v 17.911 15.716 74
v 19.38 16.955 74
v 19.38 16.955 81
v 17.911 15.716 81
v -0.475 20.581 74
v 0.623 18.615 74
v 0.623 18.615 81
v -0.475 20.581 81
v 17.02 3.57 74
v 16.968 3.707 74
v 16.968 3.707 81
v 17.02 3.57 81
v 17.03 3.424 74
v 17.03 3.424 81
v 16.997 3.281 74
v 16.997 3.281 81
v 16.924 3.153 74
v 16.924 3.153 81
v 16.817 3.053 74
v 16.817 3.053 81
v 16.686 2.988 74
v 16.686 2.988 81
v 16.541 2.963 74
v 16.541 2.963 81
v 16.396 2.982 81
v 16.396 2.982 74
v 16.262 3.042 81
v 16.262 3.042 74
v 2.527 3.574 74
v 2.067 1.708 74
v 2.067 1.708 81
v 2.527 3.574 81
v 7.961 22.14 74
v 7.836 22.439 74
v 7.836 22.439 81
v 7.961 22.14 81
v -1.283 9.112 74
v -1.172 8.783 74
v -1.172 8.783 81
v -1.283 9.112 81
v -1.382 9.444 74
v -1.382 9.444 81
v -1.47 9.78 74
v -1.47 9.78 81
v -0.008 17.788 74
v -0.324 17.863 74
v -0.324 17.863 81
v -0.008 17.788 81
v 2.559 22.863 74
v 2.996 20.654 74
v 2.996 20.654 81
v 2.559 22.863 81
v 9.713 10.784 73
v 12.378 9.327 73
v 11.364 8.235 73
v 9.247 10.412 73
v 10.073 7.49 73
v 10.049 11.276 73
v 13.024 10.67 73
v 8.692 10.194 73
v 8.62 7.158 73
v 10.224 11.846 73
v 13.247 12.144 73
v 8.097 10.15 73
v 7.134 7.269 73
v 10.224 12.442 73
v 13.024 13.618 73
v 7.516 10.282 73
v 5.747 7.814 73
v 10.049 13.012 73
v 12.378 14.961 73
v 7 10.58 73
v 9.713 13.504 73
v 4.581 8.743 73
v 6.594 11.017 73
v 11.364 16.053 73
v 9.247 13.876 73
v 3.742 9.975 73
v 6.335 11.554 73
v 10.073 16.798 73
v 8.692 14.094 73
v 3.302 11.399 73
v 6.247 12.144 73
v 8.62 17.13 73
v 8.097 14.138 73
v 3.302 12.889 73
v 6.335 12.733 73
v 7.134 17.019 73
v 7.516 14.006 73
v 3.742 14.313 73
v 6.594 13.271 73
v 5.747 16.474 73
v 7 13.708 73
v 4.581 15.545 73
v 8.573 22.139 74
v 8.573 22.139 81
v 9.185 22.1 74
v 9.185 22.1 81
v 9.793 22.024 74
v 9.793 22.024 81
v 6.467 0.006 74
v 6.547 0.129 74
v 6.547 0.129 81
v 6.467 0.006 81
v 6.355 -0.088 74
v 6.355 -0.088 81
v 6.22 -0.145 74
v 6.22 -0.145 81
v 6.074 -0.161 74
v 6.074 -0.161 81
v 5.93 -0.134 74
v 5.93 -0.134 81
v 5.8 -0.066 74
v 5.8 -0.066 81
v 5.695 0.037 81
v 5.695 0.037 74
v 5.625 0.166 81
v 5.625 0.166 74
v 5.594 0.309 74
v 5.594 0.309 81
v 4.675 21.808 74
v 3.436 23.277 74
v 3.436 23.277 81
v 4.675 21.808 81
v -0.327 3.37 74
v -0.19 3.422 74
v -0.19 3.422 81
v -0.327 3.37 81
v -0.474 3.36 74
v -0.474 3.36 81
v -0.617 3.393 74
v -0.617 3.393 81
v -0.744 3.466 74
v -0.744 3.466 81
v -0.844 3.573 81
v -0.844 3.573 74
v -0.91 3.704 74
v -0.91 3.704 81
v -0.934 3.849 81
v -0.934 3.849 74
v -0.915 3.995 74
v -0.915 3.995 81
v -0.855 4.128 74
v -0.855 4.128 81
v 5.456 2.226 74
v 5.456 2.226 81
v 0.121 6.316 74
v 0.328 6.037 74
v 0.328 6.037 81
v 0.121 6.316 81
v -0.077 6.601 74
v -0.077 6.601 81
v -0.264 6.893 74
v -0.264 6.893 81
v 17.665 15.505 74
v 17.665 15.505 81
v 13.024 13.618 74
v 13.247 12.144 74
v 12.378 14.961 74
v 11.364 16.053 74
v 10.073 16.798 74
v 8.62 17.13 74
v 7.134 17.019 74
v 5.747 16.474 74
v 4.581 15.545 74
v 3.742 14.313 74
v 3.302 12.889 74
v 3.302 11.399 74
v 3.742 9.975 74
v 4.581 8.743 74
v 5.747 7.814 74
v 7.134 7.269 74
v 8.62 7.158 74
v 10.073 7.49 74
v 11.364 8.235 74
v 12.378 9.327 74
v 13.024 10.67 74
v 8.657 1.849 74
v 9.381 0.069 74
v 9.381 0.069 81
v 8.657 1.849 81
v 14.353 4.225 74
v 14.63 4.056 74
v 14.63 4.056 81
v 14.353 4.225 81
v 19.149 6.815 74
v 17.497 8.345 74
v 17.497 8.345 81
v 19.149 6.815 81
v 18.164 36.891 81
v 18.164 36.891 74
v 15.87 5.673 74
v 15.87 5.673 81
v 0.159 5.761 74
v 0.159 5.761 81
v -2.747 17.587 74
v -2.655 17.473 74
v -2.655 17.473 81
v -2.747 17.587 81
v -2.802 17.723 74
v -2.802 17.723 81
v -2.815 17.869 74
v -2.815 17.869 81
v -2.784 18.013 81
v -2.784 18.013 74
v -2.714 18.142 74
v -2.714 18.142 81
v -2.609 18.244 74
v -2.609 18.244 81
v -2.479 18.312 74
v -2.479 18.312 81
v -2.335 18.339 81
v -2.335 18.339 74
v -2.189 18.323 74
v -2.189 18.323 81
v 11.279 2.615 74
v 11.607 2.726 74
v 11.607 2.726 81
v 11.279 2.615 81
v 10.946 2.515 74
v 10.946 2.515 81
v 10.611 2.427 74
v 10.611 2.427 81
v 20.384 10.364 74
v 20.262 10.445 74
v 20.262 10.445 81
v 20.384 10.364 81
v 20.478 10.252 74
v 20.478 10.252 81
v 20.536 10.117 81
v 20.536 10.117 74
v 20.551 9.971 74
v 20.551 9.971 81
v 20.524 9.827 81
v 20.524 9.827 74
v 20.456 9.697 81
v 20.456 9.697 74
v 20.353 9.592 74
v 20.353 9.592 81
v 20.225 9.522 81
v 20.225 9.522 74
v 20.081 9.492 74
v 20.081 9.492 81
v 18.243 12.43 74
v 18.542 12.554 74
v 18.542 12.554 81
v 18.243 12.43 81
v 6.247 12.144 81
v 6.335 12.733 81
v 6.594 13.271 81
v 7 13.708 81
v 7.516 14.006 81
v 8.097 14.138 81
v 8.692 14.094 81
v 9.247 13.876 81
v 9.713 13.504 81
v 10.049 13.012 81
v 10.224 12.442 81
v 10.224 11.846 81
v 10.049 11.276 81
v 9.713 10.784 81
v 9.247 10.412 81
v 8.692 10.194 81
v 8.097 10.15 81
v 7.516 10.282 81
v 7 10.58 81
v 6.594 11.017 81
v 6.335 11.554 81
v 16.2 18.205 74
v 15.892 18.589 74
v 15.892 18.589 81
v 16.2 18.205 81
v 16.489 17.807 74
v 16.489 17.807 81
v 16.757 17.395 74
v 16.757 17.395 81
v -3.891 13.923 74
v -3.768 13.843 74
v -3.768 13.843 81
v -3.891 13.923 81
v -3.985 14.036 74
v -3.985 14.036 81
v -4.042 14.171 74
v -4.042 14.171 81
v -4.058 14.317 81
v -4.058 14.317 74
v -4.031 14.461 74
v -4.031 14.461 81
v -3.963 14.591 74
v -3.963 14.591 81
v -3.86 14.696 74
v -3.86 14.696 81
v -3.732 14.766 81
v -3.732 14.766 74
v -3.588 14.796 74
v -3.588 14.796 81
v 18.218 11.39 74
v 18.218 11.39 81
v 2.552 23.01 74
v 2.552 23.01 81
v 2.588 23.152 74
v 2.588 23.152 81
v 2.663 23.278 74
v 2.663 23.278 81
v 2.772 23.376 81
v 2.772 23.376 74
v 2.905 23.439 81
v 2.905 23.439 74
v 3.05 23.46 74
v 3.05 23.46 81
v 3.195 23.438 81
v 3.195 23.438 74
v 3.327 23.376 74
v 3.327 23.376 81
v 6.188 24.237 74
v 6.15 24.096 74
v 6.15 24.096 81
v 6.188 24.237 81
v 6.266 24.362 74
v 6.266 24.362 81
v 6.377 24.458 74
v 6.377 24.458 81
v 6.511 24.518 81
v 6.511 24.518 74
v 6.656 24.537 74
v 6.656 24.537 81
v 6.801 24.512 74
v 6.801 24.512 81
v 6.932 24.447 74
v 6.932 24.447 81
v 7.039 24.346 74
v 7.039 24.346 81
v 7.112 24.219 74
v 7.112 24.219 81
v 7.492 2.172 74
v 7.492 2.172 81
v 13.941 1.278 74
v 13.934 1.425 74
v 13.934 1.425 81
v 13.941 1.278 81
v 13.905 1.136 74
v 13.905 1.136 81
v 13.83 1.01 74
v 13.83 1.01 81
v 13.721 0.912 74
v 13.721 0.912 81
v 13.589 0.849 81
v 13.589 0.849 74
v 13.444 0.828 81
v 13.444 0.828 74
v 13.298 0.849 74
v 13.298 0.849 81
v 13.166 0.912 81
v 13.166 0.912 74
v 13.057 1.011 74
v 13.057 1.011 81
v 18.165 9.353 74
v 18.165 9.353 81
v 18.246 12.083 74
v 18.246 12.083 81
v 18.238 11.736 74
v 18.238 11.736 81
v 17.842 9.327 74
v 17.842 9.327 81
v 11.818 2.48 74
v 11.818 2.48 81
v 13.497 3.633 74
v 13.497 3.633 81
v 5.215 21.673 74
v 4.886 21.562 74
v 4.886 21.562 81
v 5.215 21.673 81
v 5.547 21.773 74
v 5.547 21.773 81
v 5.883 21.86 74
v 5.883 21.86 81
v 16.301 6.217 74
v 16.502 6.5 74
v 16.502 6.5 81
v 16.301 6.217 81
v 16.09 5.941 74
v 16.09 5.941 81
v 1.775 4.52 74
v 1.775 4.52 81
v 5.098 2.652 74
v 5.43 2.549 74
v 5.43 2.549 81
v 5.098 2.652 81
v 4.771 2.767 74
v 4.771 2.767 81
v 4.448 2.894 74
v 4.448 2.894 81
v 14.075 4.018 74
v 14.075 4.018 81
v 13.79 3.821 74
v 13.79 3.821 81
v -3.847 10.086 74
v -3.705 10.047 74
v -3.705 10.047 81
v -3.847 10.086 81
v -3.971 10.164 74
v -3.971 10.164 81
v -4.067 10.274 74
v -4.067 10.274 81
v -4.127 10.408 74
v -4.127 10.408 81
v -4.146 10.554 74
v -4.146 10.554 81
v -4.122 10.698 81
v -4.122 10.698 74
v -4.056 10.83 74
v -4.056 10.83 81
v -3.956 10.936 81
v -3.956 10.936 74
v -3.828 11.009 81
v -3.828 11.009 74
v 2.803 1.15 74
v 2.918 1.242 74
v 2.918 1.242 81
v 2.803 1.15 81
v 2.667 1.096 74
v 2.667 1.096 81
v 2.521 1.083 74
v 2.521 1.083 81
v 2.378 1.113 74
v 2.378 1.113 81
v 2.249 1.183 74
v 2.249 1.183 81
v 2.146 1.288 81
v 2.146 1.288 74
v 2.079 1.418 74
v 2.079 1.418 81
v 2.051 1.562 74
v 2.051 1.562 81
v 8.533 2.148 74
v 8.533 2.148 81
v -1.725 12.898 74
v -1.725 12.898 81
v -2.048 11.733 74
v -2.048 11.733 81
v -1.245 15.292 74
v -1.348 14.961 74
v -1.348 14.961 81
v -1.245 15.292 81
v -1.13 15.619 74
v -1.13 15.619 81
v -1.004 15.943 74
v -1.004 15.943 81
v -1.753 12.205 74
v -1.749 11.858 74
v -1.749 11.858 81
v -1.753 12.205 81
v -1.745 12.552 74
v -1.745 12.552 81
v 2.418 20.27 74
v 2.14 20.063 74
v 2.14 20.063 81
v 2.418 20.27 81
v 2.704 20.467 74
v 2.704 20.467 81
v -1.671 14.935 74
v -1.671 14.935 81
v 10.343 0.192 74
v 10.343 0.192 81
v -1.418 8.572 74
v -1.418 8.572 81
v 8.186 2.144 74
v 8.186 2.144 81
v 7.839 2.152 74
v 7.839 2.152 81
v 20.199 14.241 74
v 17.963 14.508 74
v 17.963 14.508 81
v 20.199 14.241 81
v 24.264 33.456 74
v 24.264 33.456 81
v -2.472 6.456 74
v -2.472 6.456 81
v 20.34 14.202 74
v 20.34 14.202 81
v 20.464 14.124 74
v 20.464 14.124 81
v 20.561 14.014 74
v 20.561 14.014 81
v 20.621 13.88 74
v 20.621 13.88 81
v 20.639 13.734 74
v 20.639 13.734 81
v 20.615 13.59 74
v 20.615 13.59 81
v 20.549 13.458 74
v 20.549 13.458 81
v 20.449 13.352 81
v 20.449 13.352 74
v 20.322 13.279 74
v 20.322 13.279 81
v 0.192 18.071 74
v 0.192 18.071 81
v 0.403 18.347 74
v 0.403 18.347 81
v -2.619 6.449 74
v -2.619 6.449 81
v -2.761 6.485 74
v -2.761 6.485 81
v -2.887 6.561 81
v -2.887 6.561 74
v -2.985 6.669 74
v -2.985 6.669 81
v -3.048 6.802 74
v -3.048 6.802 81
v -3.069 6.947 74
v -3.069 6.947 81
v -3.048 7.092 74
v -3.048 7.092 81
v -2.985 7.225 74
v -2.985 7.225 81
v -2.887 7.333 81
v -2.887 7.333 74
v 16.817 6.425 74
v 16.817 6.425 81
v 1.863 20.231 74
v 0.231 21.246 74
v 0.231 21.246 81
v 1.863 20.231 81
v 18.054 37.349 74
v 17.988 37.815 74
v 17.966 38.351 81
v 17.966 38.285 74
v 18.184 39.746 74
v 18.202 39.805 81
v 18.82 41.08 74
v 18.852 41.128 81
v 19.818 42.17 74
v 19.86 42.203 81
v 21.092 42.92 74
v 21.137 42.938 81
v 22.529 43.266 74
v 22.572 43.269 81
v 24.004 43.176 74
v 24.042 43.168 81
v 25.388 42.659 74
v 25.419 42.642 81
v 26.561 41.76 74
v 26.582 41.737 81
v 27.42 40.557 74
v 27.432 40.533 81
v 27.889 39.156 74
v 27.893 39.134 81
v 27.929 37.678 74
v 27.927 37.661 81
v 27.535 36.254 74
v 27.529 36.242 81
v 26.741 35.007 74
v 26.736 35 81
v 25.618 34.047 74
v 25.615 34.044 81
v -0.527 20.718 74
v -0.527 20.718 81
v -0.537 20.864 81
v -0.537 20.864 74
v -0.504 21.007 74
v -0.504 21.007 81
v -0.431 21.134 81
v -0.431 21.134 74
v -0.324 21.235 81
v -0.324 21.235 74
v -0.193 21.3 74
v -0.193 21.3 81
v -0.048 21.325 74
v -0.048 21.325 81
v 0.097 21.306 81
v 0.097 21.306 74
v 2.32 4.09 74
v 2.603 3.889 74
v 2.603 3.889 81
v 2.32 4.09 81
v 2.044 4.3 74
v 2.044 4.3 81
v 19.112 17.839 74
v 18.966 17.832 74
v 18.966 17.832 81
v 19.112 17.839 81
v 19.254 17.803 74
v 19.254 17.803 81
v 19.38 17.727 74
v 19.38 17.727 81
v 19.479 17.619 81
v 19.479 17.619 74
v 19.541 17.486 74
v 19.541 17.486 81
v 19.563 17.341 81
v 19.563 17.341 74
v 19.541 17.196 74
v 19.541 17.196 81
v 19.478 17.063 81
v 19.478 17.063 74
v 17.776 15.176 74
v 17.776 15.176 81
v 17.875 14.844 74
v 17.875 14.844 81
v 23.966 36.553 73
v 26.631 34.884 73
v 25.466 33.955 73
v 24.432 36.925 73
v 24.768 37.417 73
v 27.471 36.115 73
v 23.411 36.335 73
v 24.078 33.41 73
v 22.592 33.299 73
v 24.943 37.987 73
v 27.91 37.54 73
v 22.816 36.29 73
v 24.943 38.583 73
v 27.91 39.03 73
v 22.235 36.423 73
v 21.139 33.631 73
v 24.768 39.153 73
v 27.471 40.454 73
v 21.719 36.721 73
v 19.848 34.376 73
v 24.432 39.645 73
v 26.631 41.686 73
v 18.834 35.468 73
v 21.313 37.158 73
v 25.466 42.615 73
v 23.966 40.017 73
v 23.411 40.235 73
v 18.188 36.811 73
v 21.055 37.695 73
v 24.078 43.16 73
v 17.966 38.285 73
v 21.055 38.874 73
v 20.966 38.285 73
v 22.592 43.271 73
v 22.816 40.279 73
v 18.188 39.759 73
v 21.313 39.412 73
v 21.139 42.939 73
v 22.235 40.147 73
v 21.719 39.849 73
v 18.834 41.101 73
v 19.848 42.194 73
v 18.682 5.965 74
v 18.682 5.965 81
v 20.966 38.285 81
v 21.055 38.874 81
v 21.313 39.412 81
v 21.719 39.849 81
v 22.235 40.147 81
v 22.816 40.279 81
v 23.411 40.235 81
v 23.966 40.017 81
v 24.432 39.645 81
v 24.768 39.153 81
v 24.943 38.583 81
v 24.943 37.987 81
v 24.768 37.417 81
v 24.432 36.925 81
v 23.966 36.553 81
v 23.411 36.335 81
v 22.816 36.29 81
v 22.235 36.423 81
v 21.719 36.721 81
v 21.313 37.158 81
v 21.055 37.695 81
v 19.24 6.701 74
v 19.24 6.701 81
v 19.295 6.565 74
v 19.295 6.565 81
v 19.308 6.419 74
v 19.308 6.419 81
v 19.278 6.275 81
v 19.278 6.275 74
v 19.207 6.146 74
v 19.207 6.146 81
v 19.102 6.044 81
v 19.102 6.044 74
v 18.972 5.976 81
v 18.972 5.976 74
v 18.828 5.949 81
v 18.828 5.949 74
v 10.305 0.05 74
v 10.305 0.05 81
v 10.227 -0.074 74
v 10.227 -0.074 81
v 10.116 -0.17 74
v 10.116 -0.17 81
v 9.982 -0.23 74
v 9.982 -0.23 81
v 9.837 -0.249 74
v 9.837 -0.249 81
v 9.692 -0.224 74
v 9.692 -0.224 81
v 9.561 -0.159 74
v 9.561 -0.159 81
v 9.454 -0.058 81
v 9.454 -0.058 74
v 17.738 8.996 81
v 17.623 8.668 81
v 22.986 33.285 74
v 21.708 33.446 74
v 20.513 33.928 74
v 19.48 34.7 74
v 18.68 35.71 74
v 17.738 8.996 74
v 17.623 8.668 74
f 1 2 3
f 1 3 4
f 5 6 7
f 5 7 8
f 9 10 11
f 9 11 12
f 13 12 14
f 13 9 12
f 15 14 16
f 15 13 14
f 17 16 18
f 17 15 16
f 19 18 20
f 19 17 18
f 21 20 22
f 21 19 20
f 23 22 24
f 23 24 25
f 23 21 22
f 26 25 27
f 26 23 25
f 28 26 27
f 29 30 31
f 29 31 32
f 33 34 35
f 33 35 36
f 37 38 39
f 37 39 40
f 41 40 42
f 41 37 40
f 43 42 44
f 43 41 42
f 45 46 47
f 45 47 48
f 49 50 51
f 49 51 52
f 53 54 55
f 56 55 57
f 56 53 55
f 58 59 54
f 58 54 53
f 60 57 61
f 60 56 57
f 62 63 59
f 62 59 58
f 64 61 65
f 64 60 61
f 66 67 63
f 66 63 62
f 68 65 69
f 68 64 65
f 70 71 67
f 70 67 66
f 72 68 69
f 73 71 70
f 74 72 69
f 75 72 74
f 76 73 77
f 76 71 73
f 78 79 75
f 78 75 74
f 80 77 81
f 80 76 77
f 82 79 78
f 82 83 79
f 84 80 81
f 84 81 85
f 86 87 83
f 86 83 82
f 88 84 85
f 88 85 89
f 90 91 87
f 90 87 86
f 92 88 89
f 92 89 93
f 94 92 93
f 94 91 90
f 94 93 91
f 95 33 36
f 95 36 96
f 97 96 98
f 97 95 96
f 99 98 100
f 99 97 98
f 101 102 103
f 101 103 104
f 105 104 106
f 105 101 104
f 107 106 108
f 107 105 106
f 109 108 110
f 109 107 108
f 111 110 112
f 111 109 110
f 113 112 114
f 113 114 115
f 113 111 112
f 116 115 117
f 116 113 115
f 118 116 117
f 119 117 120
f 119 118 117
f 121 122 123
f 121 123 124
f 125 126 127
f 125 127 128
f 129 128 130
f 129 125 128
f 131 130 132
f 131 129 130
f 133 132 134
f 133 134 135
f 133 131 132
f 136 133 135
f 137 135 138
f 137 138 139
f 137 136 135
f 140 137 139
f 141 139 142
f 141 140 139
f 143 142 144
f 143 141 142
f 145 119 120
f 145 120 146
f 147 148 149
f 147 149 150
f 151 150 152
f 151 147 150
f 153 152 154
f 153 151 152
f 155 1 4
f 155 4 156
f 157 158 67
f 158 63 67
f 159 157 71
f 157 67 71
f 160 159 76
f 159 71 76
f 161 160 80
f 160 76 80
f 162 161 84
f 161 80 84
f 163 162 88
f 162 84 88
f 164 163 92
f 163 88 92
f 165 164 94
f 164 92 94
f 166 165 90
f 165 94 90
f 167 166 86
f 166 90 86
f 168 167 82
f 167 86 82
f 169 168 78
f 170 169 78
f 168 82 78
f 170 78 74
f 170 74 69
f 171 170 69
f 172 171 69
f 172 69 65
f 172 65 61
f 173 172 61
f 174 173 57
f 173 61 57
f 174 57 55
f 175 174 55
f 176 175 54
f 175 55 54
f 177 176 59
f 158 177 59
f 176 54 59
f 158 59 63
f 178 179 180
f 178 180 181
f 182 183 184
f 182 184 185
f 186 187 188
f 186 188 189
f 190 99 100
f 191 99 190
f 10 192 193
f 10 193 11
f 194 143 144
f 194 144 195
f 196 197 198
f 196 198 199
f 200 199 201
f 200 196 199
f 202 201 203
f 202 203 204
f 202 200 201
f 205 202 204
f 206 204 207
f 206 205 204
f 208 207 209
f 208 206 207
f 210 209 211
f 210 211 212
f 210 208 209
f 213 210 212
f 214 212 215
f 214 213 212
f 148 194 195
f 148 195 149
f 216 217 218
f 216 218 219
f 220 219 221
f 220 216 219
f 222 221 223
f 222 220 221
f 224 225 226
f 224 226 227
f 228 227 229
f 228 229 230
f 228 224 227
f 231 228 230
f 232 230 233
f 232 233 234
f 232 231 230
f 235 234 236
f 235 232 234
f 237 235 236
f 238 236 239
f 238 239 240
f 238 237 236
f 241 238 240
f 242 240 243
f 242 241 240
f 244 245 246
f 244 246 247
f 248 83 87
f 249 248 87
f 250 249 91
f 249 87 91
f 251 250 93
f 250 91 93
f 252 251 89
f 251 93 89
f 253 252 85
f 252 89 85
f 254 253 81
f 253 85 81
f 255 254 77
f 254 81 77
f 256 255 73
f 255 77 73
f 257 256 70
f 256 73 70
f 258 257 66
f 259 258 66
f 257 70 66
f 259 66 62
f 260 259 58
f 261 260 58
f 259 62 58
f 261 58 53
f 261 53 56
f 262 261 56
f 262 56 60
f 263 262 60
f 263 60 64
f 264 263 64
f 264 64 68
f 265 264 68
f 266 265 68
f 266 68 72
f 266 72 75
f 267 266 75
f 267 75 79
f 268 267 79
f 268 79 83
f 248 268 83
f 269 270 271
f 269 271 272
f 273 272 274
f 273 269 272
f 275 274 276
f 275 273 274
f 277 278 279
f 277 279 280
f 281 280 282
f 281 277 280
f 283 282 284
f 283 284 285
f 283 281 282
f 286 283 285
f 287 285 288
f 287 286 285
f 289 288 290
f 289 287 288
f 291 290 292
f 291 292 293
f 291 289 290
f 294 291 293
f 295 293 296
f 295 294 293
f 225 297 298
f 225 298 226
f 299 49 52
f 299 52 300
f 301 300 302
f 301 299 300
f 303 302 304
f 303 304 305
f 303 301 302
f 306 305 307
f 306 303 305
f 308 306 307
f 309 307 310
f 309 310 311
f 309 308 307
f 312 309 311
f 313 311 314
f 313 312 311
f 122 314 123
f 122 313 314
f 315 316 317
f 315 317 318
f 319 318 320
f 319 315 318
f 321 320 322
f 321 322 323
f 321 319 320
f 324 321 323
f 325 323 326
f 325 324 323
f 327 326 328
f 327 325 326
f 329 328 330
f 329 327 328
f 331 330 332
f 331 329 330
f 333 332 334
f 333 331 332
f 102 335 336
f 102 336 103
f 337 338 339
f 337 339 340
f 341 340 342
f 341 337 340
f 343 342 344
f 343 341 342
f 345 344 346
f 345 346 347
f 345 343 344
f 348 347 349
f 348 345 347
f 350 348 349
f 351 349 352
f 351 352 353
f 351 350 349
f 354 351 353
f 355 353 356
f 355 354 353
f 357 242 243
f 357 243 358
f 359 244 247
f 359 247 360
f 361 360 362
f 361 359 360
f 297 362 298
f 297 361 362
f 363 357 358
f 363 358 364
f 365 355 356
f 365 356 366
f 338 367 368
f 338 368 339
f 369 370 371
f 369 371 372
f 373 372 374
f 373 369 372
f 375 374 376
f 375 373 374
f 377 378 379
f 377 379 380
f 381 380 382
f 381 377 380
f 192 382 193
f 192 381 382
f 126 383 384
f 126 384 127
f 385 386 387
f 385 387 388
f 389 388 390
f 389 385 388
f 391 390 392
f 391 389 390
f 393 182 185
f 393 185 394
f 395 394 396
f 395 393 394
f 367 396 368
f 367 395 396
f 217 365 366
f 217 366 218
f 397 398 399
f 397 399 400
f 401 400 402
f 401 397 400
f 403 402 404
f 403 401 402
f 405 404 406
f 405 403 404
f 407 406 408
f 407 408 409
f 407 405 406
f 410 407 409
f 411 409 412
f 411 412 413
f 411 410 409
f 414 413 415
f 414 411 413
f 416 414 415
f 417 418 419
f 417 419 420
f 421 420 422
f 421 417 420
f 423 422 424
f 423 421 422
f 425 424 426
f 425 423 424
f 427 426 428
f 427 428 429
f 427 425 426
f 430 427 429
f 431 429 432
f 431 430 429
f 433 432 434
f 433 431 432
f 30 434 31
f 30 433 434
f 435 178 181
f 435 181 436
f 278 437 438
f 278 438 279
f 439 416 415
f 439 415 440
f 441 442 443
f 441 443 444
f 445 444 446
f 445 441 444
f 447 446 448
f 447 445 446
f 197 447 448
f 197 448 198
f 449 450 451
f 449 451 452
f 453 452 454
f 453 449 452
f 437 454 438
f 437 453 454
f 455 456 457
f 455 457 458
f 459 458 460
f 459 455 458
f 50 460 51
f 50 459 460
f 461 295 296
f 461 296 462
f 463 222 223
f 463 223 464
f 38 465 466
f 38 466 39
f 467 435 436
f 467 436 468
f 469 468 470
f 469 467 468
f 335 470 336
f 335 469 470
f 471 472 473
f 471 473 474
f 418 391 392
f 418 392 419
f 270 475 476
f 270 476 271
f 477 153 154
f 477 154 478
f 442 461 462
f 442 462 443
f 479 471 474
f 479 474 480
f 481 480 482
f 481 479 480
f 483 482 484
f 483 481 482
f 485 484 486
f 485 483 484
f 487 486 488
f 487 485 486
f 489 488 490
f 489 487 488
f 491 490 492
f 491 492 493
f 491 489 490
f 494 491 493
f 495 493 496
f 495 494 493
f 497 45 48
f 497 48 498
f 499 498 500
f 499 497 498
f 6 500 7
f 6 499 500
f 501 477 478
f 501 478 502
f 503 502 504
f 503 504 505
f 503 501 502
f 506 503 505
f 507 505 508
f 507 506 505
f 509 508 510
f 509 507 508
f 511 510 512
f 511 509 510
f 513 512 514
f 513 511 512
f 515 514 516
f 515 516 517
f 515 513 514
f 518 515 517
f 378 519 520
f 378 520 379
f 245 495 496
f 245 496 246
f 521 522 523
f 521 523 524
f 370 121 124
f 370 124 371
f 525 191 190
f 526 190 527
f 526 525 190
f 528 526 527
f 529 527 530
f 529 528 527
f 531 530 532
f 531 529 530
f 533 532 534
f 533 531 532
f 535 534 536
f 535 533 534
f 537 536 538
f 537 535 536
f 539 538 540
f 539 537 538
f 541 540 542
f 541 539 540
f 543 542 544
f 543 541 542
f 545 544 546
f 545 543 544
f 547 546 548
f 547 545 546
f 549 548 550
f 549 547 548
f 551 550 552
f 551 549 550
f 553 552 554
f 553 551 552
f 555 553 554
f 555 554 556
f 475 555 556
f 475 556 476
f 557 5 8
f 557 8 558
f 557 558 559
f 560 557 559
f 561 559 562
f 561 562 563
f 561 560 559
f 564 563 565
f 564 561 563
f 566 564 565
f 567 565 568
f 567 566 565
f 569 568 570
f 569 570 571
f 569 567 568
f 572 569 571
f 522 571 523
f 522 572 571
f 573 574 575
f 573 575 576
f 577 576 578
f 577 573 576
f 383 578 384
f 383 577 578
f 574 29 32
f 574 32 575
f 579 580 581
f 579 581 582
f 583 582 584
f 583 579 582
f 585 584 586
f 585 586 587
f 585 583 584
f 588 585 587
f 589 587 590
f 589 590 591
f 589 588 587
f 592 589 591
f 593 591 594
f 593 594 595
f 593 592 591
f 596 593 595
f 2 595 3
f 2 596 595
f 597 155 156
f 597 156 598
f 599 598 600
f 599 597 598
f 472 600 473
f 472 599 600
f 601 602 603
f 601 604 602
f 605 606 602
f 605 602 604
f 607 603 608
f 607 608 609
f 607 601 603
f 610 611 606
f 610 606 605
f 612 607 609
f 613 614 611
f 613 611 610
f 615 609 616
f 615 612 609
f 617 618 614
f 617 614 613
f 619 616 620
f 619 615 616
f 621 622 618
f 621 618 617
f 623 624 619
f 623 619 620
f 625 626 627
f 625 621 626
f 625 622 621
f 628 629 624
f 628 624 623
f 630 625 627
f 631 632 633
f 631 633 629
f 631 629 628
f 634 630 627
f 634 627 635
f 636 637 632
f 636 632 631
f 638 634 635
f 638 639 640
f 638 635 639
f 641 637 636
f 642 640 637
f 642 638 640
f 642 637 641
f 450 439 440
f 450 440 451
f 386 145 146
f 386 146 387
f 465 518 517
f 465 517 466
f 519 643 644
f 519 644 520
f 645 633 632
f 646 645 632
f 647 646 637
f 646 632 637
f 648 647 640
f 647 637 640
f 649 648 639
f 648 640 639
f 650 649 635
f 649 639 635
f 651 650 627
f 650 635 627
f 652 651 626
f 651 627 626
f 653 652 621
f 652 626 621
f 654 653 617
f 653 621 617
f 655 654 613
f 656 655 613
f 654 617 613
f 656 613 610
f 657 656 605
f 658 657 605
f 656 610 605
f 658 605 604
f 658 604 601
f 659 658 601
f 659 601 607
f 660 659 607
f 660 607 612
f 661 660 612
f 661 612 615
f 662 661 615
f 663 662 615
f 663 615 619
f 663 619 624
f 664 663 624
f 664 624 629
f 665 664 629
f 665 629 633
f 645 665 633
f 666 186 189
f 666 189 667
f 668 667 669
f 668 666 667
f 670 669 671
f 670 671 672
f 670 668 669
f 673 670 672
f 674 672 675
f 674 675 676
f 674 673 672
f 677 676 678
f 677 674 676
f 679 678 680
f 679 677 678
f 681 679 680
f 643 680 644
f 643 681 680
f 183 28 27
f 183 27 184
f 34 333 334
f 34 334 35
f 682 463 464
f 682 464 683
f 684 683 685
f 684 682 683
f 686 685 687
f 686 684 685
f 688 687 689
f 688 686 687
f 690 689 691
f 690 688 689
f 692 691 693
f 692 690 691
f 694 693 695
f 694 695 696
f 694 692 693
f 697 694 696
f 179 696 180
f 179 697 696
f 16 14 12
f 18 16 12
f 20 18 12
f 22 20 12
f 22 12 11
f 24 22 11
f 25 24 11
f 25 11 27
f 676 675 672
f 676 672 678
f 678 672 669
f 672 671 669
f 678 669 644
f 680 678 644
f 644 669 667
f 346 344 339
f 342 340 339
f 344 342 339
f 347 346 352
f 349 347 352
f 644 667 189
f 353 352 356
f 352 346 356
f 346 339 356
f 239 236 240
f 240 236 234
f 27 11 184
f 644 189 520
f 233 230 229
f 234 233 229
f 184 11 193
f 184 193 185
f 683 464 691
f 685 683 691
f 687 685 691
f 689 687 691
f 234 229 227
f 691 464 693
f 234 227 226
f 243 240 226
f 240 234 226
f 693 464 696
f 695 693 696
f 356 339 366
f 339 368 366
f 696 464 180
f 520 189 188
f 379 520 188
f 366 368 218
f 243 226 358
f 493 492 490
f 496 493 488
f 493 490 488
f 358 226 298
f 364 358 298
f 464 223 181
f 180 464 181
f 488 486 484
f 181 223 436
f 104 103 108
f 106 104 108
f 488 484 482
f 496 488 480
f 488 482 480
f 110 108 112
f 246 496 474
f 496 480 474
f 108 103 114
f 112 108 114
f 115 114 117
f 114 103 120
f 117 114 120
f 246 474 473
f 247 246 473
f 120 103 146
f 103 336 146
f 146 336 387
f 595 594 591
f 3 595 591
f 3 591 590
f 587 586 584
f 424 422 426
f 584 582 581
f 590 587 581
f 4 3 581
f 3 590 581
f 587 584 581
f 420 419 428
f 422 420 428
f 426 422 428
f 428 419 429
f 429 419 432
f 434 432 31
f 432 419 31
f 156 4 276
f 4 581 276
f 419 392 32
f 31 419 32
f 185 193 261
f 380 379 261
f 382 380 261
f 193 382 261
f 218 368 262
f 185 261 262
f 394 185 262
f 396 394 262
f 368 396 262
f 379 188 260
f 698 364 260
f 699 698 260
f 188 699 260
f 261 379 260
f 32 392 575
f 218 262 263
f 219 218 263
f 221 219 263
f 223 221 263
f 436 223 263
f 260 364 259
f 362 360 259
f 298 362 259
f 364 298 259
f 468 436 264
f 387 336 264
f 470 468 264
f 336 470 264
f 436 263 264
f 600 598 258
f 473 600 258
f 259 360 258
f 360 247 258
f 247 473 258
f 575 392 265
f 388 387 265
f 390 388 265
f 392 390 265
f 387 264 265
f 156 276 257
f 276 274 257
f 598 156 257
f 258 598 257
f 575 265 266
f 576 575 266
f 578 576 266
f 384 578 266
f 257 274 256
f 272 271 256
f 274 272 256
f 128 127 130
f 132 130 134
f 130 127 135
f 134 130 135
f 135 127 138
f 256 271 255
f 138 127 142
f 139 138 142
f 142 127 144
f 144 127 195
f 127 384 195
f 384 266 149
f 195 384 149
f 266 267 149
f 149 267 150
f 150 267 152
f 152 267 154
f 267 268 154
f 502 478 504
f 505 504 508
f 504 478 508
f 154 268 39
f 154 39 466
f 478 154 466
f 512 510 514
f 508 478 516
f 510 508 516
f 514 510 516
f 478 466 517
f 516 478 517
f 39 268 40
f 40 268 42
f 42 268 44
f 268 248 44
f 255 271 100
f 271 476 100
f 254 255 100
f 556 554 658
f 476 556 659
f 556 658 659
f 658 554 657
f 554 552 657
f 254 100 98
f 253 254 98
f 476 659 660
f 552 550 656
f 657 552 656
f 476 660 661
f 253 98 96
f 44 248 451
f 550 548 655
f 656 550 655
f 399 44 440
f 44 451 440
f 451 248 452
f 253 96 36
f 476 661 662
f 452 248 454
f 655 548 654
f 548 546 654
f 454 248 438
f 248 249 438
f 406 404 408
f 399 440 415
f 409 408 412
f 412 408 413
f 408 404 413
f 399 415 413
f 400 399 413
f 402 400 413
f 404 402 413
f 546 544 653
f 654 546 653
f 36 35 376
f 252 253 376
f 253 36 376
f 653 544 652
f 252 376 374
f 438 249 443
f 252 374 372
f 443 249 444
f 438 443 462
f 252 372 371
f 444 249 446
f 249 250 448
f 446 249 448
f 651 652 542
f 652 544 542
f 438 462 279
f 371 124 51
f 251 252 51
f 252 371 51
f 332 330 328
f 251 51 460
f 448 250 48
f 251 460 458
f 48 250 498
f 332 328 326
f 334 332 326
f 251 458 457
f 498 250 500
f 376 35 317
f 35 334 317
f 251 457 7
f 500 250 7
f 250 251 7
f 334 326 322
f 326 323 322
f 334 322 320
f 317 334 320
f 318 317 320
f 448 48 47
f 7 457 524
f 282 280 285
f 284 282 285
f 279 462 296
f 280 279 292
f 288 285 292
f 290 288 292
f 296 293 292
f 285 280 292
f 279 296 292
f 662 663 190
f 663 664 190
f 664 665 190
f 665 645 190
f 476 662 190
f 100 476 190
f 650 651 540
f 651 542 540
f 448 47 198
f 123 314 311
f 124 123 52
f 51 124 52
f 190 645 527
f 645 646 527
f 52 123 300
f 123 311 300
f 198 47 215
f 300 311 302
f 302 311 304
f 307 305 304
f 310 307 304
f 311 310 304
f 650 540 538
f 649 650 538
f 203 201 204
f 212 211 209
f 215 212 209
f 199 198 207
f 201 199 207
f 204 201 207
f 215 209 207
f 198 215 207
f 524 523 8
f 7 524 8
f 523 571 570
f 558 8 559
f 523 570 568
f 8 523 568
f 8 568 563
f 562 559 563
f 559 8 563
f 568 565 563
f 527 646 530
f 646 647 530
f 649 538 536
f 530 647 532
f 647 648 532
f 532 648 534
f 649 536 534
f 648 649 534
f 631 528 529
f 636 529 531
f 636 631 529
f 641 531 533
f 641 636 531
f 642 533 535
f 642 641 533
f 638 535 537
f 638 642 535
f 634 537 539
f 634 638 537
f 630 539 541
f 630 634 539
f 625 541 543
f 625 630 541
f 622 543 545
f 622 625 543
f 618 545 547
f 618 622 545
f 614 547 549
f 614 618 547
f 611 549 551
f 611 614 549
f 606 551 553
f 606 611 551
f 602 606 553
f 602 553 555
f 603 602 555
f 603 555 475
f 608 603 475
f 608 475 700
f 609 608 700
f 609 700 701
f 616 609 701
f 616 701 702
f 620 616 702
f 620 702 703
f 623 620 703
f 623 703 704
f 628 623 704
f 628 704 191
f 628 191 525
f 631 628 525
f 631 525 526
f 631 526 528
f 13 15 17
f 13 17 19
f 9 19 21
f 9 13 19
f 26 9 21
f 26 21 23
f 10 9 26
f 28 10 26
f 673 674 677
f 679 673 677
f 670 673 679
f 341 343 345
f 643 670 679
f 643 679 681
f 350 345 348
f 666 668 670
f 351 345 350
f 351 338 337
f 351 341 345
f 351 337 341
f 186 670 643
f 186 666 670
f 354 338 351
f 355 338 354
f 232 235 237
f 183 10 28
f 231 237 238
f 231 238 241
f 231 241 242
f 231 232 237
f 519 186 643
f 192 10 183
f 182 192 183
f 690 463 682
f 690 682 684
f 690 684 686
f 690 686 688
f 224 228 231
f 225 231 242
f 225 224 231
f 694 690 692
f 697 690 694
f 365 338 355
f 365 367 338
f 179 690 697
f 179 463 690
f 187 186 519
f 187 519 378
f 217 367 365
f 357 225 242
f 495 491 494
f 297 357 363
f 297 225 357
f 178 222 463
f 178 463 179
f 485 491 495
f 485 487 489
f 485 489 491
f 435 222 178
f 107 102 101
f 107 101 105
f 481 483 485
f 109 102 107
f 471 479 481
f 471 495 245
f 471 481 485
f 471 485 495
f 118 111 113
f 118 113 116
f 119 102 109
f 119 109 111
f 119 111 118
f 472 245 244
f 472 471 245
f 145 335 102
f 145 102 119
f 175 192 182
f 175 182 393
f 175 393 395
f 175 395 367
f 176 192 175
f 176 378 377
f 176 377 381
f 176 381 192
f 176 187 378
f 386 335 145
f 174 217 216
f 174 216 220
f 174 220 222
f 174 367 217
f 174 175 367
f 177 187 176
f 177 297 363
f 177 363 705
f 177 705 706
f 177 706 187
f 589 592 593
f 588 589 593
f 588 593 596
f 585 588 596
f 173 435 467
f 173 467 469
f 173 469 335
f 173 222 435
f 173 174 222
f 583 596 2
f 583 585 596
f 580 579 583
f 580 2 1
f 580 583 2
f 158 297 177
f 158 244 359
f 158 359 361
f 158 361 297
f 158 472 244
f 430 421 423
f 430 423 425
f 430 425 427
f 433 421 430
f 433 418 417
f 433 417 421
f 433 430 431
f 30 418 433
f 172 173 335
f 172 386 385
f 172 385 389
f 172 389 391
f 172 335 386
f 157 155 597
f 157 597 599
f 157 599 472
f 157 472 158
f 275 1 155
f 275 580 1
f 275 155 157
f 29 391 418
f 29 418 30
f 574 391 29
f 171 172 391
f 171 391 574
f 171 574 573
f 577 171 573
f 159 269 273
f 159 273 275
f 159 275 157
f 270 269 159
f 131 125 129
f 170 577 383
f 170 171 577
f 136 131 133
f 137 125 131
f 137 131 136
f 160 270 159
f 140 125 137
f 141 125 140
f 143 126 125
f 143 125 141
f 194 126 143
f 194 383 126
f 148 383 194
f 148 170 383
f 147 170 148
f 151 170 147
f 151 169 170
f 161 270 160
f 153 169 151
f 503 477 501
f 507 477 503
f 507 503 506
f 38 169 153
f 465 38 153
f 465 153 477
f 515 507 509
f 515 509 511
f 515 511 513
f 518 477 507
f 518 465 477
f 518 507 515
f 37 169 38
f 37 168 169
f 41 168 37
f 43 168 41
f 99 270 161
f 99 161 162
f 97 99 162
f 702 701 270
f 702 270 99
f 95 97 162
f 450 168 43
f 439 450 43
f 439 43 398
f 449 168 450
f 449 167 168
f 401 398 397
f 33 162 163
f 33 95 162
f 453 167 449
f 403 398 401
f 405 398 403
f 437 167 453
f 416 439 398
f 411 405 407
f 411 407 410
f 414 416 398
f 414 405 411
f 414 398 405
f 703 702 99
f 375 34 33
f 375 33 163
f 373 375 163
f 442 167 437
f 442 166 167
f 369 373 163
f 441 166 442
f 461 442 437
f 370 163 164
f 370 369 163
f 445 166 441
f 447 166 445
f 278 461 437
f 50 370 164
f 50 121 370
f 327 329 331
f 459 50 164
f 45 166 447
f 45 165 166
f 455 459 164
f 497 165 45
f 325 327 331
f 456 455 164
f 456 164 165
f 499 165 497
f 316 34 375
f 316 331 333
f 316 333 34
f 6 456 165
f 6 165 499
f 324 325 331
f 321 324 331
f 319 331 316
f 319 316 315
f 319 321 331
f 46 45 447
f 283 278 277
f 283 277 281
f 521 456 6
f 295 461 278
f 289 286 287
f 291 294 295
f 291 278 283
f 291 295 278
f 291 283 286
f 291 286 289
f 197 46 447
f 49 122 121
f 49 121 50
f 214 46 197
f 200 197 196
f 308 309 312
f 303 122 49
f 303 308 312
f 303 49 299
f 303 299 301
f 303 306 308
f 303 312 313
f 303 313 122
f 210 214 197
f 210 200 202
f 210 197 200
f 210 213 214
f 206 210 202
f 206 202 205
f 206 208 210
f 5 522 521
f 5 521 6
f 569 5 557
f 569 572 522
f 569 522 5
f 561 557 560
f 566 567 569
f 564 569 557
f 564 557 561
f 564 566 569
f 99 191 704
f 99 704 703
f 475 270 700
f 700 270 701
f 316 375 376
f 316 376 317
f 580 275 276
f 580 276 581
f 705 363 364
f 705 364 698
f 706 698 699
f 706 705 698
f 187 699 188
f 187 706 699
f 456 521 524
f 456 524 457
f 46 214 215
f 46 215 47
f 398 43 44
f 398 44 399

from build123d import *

# Parameters (mm, degrees)
BOSS_EXTRUDE1_DEPTH      = 7
BOSS_EXTRUDE2_START      = 1
SKETCH2_R                = 5
BOSS_EXTRUDE2_DEPTH      = 1
SKETCH3_W                = 5
SKETCH3_H                = 1
F_4_0_4_DIAMETER_HOLE1_D = 4


with BuildPart() as part:
    # Sketch1 → Boss-Extrude1 (new body)
    with BuildSketch(Plane(origin=(0, 0, 74), x_dir=(-1, 0, 0), z_dir=(0, 0, -1))):
        with BuildLine():
            Line((-9.792858273, 22.023664764), (-18.163987442, 36.890703242))
            ThreePointArc((-18.163987442, 36.890703242), (-25.418865109, 42.641693781), (-24.263539525, 33.456250682))
            Line((-24.263539525, 33.456250682), (-15.892410356, 18.589212204))
            ThreePointArc((-15.892410356, 18.589212204), (-16.346796769, 18.007963525), (-16.757092444, 17.394795929))
            Line((-16.757092444, 17.394795929), (-18.965700238, 17.831555144))
            ThreePointArc((-18.965700238, 17.831555144), (-19.514808102, 17.55458812), (-19.379909826, 16.954560925))
            Line((-19.379909826, 16.954560925), (-17.910889228, 15.715657441))
            Line((-17.910889228, 15.715657441), (-17.664910308, 15.504807423))
            ThreePointArc((-17.664910308, 15.504807423), (-17.827013037, 15.010242888), (-17.963165175, 14.507914341))
            Line((-17.963165175, 14.507914341), (-20.19864203, 14.240799695))
            ThreePointArc((-20.19864203, 14.240799695), (-20.635287125, 13.80770474), (-20.32157264, 13.278730827))
            Line((-20.32157264, 13.278730827), (-18.541608797, 12.554415925))
            Line((-18.541608797, 12.554415925), (-18.242512703, 12.429897308))
            ThreePointArc((-18.242512703, 12.429897308), (-18.243852713, 11.909445986), (-18.218113034, 11.389629824))
            Line((-18.218113034, 11.389629824), (-20.261634899, 10.444788361))
            ThreePointArc((-20.261634899, 10.444788361), (-20.543075361, 9.897959827), (-20.081253227, 9.491818847))
            Line((-20.081253227, 9.491818847), (-18.164581401, 9.352993516))
            Line((-18.164581401, 9.352993516), (-17.841645743, 9.32699505))
            ThreePointArc((-17.841645743, 9.32699505), (-17.682091866, 8.831602343), (-17.496979948, 8.345181793))
            Line((-17.496979948, 8.345181793), (-19.148512665, 6.815101178))
            ThreePointArc((-19.148512665, 6.815101178), (-19.247199139, 6.208066452), (-18.682475725, 5.964514314))
            Line((-18.682475725, 5.964514314), (-16.816713109, 6.424767746))
            Line((-16.816713109, 6.424767746), (-16.501549079, 6.499834341))
            ThreePointArc((-16.501549079, 6.499834341), (-16.196719559, 6.077992739), (-15.870355447, 5.672582033))
            Line((-15.870355447, 5.672582033), (-16.968235486, 3.707037218))
            ThreePointArc((-16.968235486, 3.707037218), (-16.874507855, 3.099217089), (-16.262162222, 3.042094373))
            Line((-16.262162222, 3.042094373), (-14.62994266, 4.056373754))
            Line((-14.62994266, 4.056373754), (-14.353400709, 4.22515737))
            ThreePointArc((-14.353400709, 4.22515737), (-13.933134384, 3.918159668), (-13.497464871, 3.633443231))
            Line((-13.497464871, 3.633443231), (-13.934224085, 1.424835437))
            ThreePointArc((-13.934224085, 1.424835437), (-13.657257061, 0.875727573), (-13.057229867, 1.010625848))
            Line((-13.057229867, 1.010625848), (-11.818326382, 2.479646446))
            Line((-11.818326382, 2.479646446), (-11.607476364, 2.725625367))
            ThreePointArc((-11.607476364, 2.725625367), (-11.112911829, 2.563522638), (-10.610583282, 2.427370499))
            Line((-10.610583282, 2.427370499), (-10.343468637, 0.191893645))
            ThreePointArc((-10.343468637, 0.191893645), (-9.910373682, -0.24475145), (-9.381399768, 0.068963034))
            Line((-9.381399768, 0.068963034), (-8.657084866, 1.848926878))
            Line((-8.657084866, 1.848926878), (-8.532566249, 2.148022972))
            ThreePointArc((-8.532566249, 2.148022972), (-8.012114927, 2.146682961), (-7.492298765, 2.17242264))
            Line((-7.492298765, 2.17242264), (-6.547457302, 0.128900776))
            ThreePointArc((-6.547457302, 0.128900776), (-6.000628768, -0.152539686), (-5.594487788, 0.309282448))
            Line((-5.594487788, 0.309282448), (-5.455662457, 2.225954274))
            Line((-5.455662457, 2.225954274), (-5.429663991, 2.548889932))
            ThreePointArc((-5.429663991, 2.548889932), (-4.934271284, 2.708443809), (-4.447850734, 2.893555727))
            Line((-4.447850734, 2.893555727), (-2.917770119, 1.24202301))
            ThreePointArc((-2.917770119, 1.24202301), (-2.310735394, 1.143336536), (-2.067183255, 1.70805995))
            Line((-2.067183255, 1.70805995), (-2.527436687, 3.573822566))
            Line((-2.527436687, 3.573822566), (-2.602503283, 3.888986596))
            ThreePointArc((-2.602503283, 3.888986596), (-2.18066168, 4.193816116), (-1.775250975, 4.520180228))
            Line((-1.775250975, 4.520180228), (0.19029384, 3.422300189))
            ThreePointArc((0.19029384, 3.422300189), (0.79811397, 3.51602782), (0.855236686, 4.128373453))
            Line((0.855236686, 4.128373453), (-0.159042695, 5.760593015))
            Line((-0.159042695, 5.760593015), (-0.327826311, 6.037134965))
            ThreePointArc((-0.327826311, 6.037134965), (-0.020828609, 6.457401291), (0.263887828, 6.893070804))
            Line((0.263887828, 6.893070804), (2.472495622, 6.45631159))
            ThreePointArc((2.472495622, 6.45631159), (3.021603486, 6.733278614), (2.88670521, 7.333305808))
            Line((2.88670521, 7.333305808), (1.417684612, 8.572209293))
            Line((1.417684612, 8.572209293), (1.171705692, 8.783059311))
            ThreePointArc((1.171705692, 8.783059311), (1.333808421, 9.277623846), (1.469960559, 9.779952393))
            Line((1.469960559, 9.779952393), (3.705437414, 10.047067038))
            ThreePointArc((3.705437414, 10.047067038), (4.142082509, 10.480161993), (3.828368024, 11.009135907))
            Line((3.828368024, 11.009135907), (2.048404181, 11.733450809))
            Line((2.048404181, 11.733450809), (1.749308087, 11.857969426))
            ThreePointArc((1.749308087, 11.857969426), (1.750648097, 12.378420747), (1.724908418, 12.89823691))
            Line((1.724908418, 12.89823691), (3.768430283, 13.843078373))
            ThreePointArc((3.768430283, 13.843078373), (4.049870744, 14.389906907), (3.588048611, 14.796047887))
            Line((3.588048611, 14.796047887), (1.671376785, 14.934873217))
            Line((1.671376785, 14.934873217), (1.348441127, 14.960871684))
            ThreePointArc((1.348441127, 14.960871684), (1.188887249, 15.45626439), (1.003775332, 15.942684941))
            Line((1.003775332, 15.942684941), (2.655308048, 17.472765555))
            ThreePointArc((2.655308048, 17.472765555), (2.753994523, 18.079800281), (2.189271109, 18.32335242))
            Line((2.189271109, 18.32335242), (0.323508493, 17.863098988))
            Line((0.323508493, 17.863098988), (0.008344463, 17.788032392))
            ThreePointArc((0.008344463, 17.788032392), (-0.296485057, 18.209873994), (-0.622849169, 18.6152847))
            Line((-0.622849169, 18.6152847), (0.47503087, 20.580829515))
            ThreePointArc((0.47503087, 20.580829515), (0.381303238, 21.188649645), (-0.231042394, 21.245772361))
            Line((-0.231042394, 21.245772361), (-1.863261956, 20.23149298))
            Line((-1.863261956, 20.23149298), (-2.139803907, 20.062709363))
            ThreePointArc((-2.139803907, 20.062709363), (-2.560070232, 20.369707066), (-2.995739745, 20.654423502))
            Line((-2.995739745, 20.654423502), (-2.558980531, 22.863031297))
            ThreePointArc((-2.558980531, 22.863031297), (-2.835947555, 23.412139161), (-3.43597475, 23.277240885))
            Line((-3.43597475, 23.277240885), (-4.674878234, 21.808220287))
            Line((-4.674878234, 21.808220287), (-4.885728252, 21.562241367))
            ThreePointArc((-4.885728252, 21.562241367), (-5.380292787, 21.724344095), (-5.882621334, 21.860496234))
            Line((-5.882621334, 21.860496234), (-6.149735979, 24.095973089))
            ThreePointArc((-6.149735979, 24.095973089), (-6.582830934, 24.532618183), (-7.111804848, 24.218903699))
            Line((-7.111804848, 24.218903699), (-7.83611975, 22.438939856))
            Line((-7.83611975, 22.438939856), (-7.960638367, 22.139843762))
            ThreePointArc((-7.960638367, 22.139843762), (-8.879420123, 22.123890361), (-9.792858273, 22.023664764))
        make_face()
    extrude(amount=-BOSS_EXTRUDE1_DEPTH)

    # Sketch2 → Boss-Extrude2 (add)
    with BuildSketch(Plane(origin=(0, 0, 74), x_dir=(-1, 0, 0), z_dir=(0, 0, -1)).offset(BOSS_EXTRUDE2_START)):
        with Locations((-22.965684708, 38.284870865)):
            Circle(SKETCH2_R)
    extrude(amount=-BOSS_EXTRUDE2_DEPTH)

    # Sketch3 → Revolve1 (revolve)
    with BuildSketch(Plane(origin=(0, 12.143933367, 0), x_dir=(1, 0, 0), z_dir=(0, 1, 0))):
        with Locations((10.746602308, -73.5)):
            Rectangle(SKETCH3_W, SKETCH3_H)
    revolve(axis=Axis((8.246602308, 12.143933367, 73), (0, 0, 1)))

    # Ø4.0 (4) Diameter Hole1 (through all)
    with Locations(Plane.XY.offset(81)):
        with Locations((22.965684708, 38.284870865), (8.246602308, 12.143933367)):
            Hole(F_4_0_4_DIAMETER_HOLE1_D / 2)


solid = part.part
